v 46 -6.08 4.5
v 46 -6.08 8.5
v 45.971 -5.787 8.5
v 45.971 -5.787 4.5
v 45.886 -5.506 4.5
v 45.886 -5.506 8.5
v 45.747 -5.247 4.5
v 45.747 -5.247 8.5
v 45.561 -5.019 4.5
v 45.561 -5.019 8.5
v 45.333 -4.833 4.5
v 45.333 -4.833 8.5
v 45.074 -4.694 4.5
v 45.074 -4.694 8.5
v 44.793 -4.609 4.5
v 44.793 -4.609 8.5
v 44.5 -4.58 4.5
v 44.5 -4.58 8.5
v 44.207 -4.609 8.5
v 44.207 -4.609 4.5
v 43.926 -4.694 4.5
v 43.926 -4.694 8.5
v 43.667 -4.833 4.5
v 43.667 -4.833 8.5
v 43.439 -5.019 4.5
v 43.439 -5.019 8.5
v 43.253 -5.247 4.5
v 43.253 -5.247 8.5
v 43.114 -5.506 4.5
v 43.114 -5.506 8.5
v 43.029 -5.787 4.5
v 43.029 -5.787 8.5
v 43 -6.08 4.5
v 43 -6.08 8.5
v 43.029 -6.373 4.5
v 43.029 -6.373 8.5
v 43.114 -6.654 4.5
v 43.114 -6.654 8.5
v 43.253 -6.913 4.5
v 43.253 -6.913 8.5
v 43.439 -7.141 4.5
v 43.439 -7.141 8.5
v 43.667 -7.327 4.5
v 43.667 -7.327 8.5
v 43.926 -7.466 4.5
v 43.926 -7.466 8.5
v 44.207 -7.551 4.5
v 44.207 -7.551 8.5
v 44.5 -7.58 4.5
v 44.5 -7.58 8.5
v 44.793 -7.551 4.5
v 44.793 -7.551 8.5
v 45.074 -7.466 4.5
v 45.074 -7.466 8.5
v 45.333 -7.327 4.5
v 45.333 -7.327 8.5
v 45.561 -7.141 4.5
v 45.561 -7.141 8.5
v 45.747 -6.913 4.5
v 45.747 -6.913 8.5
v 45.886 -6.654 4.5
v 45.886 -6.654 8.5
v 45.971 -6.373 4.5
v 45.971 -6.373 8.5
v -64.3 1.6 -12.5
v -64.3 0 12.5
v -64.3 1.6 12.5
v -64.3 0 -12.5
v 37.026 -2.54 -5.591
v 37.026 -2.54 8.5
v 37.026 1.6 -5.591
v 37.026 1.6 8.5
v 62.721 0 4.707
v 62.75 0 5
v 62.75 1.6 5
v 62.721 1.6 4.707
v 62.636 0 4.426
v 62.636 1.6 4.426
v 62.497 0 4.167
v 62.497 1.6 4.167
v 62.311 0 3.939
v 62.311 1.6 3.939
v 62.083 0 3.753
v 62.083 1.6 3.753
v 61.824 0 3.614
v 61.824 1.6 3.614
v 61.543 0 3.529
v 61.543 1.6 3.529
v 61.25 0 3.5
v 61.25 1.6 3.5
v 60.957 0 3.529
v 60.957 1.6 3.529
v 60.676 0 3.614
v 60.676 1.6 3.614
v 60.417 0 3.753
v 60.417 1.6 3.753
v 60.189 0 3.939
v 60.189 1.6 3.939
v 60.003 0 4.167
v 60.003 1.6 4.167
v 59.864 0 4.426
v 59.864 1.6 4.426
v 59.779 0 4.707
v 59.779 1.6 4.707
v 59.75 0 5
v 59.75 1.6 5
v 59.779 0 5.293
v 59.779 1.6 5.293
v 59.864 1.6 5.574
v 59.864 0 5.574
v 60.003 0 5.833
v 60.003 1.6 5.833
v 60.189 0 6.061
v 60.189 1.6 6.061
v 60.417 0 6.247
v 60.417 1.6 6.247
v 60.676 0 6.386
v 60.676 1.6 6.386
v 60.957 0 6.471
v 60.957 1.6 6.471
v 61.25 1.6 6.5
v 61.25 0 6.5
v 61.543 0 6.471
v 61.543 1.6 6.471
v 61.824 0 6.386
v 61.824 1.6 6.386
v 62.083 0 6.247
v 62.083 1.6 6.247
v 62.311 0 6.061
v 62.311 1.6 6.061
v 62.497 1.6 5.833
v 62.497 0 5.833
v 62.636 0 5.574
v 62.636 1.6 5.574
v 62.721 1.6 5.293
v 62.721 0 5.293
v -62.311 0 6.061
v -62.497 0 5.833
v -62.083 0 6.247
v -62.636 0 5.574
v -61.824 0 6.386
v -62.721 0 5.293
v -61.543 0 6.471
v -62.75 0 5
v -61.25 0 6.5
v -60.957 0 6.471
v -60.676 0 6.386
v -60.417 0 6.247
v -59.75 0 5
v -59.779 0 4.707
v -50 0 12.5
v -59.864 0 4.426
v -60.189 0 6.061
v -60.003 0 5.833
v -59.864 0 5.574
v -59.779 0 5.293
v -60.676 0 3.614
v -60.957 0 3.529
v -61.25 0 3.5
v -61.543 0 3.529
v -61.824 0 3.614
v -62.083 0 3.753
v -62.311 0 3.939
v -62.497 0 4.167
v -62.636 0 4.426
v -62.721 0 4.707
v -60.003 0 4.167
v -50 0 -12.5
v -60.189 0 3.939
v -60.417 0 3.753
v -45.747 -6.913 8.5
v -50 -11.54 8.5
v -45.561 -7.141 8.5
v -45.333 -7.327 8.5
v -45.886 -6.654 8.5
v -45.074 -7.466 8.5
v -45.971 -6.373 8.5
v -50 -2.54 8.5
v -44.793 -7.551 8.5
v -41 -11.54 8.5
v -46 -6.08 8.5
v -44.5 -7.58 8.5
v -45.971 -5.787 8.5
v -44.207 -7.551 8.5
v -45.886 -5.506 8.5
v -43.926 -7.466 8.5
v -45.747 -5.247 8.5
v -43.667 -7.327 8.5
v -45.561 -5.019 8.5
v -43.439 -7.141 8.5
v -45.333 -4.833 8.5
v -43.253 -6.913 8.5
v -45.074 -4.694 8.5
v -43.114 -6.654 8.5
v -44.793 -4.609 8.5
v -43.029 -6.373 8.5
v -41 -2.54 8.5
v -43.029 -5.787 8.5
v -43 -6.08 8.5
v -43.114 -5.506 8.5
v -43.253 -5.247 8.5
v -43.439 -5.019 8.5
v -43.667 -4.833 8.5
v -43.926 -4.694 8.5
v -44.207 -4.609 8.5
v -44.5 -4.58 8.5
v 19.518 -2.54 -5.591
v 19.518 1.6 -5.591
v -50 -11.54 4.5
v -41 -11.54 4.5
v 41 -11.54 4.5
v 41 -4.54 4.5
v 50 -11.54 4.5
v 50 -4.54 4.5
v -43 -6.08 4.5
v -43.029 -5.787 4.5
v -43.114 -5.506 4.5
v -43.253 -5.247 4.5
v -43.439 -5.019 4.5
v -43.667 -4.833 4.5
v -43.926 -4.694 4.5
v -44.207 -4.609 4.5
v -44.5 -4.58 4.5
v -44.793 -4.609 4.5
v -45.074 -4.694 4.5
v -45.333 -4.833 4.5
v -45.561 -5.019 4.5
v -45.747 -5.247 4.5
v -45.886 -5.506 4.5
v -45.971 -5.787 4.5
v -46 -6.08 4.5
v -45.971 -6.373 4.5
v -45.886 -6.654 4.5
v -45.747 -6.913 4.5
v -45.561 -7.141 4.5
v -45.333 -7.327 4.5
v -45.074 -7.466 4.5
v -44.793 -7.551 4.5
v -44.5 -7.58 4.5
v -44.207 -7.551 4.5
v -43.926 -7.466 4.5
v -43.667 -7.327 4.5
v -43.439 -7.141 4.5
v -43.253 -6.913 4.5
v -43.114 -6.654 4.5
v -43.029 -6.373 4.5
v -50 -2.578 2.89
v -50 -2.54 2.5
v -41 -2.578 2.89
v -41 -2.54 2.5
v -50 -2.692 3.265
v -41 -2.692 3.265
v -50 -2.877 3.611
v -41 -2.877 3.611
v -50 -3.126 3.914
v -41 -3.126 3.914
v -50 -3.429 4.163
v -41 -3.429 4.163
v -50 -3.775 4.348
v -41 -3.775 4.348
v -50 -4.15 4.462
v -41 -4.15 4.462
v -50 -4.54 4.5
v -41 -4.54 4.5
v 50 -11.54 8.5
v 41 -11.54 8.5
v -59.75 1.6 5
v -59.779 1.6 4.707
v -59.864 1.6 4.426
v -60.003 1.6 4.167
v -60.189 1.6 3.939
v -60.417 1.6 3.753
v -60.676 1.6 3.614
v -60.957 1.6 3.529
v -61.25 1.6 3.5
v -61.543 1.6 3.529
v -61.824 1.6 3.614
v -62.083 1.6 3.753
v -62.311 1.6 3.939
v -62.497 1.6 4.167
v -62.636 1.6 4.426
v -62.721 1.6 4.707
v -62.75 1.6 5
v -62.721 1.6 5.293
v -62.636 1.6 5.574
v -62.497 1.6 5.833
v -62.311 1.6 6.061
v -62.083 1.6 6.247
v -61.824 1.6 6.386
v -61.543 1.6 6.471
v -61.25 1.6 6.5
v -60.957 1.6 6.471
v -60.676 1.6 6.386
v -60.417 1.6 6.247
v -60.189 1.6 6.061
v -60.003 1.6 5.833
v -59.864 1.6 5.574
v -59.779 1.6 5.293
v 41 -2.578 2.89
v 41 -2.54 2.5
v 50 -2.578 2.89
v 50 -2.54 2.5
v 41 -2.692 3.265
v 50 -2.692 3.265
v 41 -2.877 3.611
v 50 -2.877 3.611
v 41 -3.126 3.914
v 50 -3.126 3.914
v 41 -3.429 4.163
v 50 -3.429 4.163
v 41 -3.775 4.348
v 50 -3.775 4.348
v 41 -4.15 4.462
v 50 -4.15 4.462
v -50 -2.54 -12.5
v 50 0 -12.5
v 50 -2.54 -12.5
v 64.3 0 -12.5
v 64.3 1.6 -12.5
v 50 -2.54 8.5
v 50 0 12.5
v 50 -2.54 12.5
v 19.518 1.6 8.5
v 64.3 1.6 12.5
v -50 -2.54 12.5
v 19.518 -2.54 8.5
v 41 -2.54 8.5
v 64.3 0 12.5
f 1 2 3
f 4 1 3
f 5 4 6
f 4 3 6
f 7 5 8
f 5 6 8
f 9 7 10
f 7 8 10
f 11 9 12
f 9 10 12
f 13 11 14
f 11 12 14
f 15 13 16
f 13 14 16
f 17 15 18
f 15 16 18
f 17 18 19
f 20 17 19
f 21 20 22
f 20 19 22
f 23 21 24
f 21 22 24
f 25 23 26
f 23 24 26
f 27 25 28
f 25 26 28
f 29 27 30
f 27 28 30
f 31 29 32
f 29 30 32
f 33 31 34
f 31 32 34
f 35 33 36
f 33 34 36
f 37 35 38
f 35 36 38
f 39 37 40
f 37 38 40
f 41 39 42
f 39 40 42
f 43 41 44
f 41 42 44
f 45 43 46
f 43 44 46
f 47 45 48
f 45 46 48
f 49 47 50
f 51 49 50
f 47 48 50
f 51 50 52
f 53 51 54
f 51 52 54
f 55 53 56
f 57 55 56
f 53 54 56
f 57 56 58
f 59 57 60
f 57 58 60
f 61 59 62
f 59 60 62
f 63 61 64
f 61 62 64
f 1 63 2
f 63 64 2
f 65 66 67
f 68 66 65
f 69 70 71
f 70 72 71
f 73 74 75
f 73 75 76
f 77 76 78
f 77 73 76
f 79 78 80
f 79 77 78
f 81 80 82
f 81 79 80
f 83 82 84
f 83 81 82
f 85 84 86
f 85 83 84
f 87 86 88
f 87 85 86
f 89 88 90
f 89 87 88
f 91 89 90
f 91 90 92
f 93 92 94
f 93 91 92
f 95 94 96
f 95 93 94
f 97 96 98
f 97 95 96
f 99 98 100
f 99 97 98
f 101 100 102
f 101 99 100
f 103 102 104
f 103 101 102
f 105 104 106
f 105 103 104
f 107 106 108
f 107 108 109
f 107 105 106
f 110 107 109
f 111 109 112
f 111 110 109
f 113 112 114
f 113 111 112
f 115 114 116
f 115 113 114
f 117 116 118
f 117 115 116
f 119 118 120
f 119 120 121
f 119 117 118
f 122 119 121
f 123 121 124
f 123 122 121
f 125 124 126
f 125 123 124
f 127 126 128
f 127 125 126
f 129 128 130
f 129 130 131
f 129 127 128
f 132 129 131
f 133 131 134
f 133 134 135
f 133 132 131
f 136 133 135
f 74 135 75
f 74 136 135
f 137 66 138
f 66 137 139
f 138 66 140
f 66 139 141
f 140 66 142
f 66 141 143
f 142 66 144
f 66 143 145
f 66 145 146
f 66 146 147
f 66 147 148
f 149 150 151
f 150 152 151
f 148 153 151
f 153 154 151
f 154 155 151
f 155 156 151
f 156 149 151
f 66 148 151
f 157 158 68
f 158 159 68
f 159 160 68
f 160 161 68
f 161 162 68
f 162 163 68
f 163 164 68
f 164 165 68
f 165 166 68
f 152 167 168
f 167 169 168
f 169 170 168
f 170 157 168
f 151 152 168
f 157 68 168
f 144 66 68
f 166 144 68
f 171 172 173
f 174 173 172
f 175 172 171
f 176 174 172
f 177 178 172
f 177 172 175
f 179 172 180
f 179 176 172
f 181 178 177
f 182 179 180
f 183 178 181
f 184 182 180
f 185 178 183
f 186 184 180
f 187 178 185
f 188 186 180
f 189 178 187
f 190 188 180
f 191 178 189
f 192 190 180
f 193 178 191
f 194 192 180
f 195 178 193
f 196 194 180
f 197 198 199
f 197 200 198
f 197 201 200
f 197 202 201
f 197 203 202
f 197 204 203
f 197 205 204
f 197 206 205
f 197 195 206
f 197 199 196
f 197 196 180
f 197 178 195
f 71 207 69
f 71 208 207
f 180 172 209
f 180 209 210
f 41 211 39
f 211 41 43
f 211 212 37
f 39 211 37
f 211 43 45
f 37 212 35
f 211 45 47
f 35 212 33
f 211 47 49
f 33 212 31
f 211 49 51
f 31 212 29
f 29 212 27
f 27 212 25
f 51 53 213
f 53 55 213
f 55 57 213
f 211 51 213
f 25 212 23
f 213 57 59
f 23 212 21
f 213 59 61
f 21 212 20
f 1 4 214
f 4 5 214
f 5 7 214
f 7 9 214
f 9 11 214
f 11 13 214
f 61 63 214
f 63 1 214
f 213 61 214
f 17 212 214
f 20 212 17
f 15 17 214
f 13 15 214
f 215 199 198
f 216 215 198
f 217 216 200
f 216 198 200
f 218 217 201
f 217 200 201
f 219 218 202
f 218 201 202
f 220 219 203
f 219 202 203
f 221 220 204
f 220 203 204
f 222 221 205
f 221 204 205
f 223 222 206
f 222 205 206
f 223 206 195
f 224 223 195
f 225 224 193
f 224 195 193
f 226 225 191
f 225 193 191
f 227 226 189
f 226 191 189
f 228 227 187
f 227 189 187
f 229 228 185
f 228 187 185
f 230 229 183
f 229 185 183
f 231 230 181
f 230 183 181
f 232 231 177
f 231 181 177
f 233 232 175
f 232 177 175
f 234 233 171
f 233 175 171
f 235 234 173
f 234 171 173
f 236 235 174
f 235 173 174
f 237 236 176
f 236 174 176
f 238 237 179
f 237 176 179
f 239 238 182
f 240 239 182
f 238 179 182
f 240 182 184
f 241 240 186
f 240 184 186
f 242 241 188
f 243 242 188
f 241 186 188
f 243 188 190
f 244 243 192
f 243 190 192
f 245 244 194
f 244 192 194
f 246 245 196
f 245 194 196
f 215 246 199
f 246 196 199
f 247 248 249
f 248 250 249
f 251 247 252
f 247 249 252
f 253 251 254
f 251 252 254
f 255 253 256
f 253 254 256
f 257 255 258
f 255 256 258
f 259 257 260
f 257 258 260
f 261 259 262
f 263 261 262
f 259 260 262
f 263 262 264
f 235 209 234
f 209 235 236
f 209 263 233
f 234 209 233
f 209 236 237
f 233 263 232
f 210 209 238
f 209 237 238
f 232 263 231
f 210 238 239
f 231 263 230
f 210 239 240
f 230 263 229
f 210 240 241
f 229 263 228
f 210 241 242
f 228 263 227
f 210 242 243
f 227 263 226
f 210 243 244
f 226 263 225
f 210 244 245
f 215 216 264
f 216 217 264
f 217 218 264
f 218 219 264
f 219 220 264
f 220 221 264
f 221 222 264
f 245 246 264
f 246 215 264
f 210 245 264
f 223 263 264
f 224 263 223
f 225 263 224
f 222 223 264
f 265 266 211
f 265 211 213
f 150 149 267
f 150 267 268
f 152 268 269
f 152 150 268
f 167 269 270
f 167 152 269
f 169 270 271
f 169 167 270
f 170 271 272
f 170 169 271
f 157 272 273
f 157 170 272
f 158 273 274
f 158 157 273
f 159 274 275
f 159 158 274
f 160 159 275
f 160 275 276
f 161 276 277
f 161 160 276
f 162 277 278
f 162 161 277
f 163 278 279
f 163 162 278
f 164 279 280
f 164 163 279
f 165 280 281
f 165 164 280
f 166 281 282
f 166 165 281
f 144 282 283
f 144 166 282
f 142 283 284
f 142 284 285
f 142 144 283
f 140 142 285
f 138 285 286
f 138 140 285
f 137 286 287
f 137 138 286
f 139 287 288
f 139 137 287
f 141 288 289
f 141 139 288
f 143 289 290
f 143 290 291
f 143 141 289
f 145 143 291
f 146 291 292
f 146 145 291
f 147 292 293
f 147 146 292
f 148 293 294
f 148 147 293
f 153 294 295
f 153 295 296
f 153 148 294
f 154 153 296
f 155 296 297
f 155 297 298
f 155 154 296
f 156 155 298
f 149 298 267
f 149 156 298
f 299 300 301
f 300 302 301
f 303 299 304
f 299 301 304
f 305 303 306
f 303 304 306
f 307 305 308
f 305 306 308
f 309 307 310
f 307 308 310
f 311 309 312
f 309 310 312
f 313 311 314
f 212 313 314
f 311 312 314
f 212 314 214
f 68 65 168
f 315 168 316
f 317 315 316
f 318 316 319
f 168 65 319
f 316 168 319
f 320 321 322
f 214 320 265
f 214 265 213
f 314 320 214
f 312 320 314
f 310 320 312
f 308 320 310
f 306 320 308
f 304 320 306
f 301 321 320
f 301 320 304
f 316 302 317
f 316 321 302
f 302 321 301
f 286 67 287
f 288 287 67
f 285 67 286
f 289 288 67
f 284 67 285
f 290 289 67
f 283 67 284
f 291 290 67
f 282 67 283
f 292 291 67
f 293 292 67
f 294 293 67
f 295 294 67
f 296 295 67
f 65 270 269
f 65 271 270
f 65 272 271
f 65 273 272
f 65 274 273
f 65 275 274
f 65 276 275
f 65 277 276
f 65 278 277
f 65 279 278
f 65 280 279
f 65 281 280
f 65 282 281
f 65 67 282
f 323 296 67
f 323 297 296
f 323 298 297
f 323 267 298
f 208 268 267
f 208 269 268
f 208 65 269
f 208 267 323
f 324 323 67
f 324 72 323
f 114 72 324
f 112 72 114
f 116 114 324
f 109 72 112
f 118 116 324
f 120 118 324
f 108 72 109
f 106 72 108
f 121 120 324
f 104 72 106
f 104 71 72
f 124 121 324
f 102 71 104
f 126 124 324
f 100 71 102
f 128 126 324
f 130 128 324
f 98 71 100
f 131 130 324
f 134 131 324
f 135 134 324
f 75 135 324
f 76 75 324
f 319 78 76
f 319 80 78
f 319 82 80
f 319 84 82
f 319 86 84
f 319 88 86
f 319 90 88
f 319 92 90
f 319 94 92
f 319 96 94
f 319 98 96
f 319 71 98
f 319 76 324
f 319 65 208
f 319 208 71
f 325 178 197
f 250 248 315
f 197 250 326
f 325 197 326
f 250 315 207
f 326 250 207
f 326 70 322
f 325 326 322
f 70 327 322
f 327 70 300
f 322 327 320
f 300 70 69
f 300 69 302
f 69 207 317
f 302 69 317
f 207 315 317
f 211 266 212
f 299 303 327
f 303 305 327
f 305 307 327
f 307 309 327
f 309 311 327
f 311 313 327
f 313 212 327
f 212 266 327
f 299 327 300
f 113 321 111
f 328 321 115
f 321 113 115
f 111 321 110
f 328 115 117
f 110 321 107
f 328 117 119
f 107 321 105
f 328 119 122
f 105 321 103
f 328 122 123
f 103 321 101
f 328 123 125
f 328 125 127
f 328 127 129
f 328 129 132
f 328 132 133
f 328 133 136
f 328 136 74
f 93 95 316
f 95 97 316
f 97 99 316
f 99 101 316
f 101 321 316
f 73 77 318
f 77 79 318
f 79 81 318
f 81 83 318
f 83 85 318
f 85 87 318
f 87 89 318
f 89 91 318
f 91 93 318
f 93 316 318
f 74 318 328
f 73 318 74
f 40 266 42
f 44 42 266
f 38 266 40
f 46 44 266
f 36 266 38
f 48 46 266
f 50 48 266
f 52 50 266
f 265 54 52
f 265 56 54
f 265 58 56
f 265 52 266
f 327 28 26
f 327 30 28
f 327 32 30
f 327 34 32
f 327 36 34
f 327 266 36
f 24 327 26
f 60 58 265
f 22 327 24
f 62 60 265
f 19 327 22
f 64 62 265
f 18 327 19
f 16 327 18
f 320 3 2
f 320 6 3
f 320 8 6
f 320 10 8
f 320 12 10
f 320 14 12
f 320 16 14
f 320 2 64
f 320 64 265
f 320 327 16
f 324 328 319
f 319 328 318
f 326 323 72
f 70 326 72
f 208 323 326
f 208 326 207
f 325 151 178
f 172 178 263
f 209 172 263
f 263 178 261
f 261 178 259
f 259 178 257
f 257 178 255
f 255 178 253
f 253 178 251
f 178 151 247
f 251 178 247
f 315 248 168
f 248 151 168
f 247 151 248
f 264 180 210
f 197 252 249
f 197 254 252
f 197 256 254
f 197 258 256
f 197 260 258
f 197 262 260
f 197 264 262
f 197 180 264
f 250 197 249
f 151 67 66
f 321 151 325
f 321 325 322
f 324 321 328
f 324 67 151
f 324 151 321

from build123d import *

# Parameters (mm, degrees)
SKETCH1_W           = 128.6
SKETCH1_H           = 25
SKETCH1_R           = 1.5
SKETCH1_W_2         = 17.508
SKETCH1_H_2         = 14.090792215
BOSS_EXTRUDE1_DEPTH = 1.6
SKETCH3_W           = 100
SKETCH3_H           = 25
SKETCH3_W_2         = 17.508
SKETCH3_H_2         = 14.090792215
BOSS_EXTRUDE4_DEPTH = 2.54
SKETCH4_W           = 9
SKETCH4_H           = 9
SKETCH4_R           = 1.5
BOSS_EXTRUDE5_DEPTH = 4
FILLET1_R           = 2


with BuildPart() as part:
    # Sketch1 → Boss-Extrude1 (new body)
    with BuildSketch(Plane(origin=(0, 0, 0), x_dir=(1, 0, 0), z_dir=(0, 1, 0))):
        Rectangle(SKETCH1_W, SKETCH1_H)
        with Locations((-61.25, -5)):
            Circle(SKETCH1_R, mode=Mode.SUBTRACT)
        with Locations((61.25, -5)):
            Circle(SKETCH1_R, mode=Mode.SUBTRACT)
        with Locations((28.271706015, -1.454603892)):
            Rectangle(SKETCH1_W_2, SKETCH1_H_2, mode=Mode.SUBTRACT)
    extrude(amount=BOSS_EXTRUDE1_DEPTH)

    # Sketch3 → Boss-Extrude4 (add)
    with BuildSketch(Plane(origin=(0, 0, 0), x_dir=(1, 0, 0), z_dir=(0, 1, 0))):
        Rectangle(SKETCH3_W, SKETCH3_H)
        with Locations((28.271706015, -1.454603892)):
            Rectangle(SKETCH3_W_2, SKETCH3_H_2, mode=Mode.SUBTRACT)
    extrude(amount=-BOSS_EXTRUDE4_DEPTH)

    # Sketch4 → Boss-Extrude5 (add)
    with BuildSketch(Plane.XY.offset(8.5)):
        with Locations((-45.5, -7.04)):
            Rectangle(SKETCH4_W, SKETCH4_H)
        with Locations((-44.5, -6.08)):
            Circle(SKETCH4_R, mode=Mode.SUBTRACT)
        with Locations((45.5, -7.04)):
            Rectangle(SKETCH4_W, SKETCH4_H)
        with Locations((44.5, -6.08)):
            Circle(SKETCH4_R, mode=Mode.SUBTRACT)
    extrude(amount=-BOSS_EXTRUDE5_DEPTH)

    # Fillet1
    fillet1_edges = [part.edges().sort_by_distance(p)[0] for p in [
        (-45.5, -2.54, 4.5),
        (45.5, -2.54, 4.5),
    ]]
    fillet(fillet1_edges, radius=FILLET1_R)


solid = part.part
